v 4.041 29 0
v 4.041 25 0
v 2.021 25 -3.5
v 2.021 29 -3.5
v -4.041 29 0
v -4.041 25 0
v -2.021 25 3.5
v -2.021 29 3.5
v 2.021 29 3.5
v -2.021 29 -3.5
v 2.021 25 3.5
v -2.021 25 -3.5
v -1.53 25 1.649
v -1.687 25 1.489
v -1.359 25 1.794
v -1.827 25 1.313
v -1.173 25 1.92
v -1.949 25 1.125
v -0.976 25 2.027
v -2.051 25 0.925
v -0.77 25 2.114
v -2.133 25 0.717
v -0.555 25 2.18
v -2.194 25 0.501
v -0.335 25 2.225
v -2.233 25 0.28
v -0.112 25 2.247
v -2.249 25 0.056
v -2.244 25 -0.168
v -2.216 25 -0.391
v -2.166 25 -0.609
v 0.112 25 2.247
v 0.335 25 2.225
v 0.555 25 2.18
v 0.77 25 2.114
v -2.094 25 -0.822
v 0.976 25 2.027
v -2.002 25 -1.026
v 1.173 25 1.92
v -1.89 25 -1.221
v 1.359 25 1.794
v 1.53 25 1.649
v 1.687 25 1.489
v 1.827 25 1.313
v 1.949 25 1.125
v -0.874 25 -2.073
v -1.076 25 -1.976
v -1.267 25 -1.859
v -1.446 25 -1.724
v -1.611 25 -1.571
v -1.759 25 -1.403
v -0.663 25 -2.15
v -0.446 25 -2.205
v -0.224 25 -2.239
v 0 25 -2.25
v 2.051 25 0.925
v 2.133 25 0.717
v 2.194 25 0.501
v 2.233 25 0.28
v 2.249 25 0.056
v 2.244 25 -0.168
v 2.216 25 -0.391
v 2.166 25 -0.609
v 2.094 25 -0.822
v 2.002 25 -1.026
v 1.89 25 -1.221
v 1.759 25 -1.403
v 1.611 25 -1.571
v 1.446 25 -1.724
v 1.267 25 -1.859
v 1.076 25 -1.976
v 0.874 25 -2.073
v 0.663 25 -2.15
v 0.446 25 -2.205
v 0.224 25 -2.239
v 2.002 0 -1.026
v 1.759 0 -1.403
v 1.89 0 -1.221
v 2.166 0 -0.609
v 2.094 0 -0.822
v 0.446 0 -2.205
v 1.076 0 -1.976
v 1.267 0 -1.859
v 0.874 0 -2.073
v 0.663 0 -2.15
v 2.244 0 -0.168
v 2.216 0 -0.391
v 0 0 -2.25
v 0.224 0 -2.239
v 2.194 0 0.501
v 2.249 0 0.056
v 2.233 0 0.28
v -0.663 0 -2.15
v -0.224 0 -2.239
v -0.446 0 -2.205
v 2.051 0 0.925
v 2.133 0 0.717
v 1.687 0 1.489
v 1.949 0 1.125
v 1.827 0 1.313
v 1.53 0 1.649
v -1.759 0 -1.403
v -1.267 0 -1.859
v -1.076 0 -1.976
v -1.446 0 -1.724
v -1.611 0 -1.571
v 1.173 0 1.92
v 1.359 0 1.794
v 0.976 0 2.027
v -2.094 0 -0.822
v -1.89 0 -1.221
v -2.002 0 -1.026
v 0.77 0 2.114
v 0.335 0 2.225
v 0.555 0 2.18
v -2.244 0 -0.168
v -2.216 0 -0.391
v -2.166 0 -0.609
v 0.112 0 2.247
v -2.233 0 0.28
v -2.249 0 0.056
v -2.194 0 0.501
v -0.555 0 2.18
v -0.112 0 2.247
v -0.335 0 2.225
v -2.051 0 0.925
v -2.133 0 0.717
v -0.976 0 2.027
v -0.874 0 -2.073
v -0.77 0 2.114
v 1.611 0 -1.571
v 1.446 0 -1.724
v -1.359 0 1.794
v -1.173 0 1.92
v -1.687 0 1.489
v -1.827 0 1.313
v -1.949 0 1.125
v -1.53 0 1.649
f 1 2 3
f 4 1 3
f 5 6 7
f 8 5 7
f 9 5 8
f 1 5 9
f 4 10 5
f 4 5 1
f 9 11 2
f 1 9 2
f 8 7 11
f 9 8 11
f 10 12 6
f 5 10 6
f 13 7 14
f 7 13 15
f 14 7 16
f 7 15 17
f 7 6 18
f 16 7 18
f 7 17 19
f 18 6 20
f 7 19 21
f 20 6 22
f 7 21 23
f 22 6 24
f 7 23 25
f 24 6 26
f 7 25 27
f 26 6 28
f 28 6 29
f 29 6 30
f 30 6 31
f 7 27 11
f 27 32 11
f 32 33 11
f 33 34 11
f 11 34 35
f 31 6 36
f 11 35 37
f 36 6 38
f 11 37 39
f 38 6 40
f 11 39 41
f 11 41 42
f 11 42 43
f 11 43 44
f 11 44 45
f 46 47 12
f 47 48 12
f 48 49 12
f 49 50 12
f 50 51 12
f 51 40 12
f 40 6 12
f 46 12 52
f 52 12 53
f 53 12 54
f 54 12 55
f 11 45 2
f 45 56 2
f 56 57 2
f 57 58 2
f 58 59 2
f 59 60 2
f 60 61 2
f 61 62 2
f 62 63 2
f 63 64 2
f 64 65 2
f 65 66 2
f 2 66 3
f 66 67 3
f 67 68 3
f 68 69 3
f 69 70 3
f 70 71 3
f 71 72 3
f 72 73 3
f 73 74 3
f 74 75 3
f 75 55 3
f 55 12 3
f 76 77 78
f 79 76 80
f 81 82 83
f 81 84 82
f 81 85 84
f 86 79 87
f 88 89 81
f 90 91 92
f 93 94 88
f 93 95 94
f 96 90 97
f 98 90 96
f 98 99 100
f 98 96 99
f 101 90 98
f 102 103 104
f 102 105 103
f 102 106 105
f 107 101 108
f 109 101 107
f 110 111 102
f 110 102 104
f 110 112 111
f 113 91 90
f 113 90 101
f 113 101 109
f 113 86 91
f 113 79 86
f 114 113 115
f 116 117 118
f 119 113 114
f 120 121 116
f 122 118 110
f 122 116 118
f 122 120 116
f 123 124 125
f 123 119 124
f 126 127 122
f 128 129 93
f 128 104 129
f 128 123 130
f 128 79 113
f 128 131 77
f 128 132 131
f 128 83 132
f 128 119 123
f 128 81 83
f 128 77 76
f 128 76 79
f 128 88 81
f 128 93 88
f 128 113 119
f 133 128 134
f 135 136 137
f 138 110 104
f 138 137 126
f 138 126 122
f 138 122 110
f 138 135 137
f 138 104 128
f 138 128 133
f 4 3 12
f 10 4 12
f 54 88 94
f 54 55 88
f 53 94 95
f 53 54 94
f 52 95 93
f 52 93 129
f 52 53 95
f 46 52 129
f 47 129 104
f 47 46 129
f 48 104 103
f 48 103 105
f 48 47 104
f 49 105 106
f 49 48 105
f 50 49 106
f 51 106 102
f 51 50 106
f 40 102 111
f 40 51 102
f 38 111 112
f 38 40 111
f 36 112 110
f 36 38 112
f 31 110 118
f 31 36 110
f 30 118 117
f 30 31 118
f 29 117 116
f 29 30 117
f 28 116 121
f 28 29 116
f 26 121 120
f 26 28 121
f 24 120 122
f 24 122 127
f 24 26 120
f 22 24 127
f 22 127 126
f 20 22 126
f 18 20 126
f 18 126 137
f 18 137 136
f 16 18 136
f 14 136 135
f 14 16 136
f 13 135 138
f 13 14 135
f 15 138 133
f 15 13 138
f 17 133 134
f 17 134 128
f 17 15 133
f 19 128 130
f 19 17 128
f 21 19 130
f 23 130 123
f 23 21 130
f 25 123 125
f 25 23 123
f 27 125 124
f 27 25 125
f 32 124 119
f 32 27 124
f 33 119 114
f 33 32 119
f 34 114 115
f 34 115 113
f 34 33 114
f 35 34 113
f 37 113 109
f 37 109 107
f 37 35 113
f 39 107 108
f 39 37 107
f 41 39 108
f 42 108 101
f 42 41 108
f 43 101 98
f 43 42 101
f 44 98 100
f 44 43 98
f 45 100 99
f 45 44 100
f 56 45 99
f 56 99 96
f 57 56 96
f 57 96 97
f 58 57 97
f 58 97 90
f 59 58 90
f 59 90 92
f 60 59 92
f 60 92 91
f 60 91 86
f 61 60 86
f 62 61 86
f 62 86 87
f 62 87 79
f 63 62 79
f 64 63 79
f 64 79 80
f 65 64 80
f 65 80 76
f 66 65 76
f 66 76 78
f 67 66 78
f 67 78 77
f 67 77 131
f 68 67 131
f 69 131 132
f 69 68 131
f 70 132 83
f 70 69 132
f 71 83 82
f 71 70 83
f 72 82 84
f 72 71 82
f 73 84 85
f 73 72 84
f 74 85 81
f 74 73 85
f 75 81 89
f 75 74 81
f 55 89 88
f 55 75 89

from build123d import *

# Parameters (mm, degrees)
SKETCH2_W           = 2.25
SKETCH2_H           = 25
BOSS_EXTRUDE1_DEPTH = 4


with BuildPart() as part:
    # Sketch2 → Revolve1 (revolve)
    with BuildSketch(Plane.XY, mode=Mode.PRIVATE) as revolve1_sk:
        with Locations((1.125, 12.5)):
            Rectangle(SKETCH2_W, SKETCH2_H)
    revolve(revolve1_sk.sketch.rotate(Axis((0, 0, 0), (0, 1, 0)), 90), axis=Axis((0, 0, 0), (0, 1, 0)))

    # Sketch3 → Boss-Extrude1 (add)
    with BuildSketch(Plane(origin=(0, 25, 0), x_dir=(1, 0, 0), z_dir=(0, 1, 0))):
        Polygon((4.041451884, 0), (2.020725942, 3.5), (-2.020725942, 3.5), (-4.041451884, 0), (-2.020725942, -3.5), (2.020725942, -3.5), align=None)
    extrude(amount=BOSS_EXTRUDE1_DEPTH)


solid = part.part
